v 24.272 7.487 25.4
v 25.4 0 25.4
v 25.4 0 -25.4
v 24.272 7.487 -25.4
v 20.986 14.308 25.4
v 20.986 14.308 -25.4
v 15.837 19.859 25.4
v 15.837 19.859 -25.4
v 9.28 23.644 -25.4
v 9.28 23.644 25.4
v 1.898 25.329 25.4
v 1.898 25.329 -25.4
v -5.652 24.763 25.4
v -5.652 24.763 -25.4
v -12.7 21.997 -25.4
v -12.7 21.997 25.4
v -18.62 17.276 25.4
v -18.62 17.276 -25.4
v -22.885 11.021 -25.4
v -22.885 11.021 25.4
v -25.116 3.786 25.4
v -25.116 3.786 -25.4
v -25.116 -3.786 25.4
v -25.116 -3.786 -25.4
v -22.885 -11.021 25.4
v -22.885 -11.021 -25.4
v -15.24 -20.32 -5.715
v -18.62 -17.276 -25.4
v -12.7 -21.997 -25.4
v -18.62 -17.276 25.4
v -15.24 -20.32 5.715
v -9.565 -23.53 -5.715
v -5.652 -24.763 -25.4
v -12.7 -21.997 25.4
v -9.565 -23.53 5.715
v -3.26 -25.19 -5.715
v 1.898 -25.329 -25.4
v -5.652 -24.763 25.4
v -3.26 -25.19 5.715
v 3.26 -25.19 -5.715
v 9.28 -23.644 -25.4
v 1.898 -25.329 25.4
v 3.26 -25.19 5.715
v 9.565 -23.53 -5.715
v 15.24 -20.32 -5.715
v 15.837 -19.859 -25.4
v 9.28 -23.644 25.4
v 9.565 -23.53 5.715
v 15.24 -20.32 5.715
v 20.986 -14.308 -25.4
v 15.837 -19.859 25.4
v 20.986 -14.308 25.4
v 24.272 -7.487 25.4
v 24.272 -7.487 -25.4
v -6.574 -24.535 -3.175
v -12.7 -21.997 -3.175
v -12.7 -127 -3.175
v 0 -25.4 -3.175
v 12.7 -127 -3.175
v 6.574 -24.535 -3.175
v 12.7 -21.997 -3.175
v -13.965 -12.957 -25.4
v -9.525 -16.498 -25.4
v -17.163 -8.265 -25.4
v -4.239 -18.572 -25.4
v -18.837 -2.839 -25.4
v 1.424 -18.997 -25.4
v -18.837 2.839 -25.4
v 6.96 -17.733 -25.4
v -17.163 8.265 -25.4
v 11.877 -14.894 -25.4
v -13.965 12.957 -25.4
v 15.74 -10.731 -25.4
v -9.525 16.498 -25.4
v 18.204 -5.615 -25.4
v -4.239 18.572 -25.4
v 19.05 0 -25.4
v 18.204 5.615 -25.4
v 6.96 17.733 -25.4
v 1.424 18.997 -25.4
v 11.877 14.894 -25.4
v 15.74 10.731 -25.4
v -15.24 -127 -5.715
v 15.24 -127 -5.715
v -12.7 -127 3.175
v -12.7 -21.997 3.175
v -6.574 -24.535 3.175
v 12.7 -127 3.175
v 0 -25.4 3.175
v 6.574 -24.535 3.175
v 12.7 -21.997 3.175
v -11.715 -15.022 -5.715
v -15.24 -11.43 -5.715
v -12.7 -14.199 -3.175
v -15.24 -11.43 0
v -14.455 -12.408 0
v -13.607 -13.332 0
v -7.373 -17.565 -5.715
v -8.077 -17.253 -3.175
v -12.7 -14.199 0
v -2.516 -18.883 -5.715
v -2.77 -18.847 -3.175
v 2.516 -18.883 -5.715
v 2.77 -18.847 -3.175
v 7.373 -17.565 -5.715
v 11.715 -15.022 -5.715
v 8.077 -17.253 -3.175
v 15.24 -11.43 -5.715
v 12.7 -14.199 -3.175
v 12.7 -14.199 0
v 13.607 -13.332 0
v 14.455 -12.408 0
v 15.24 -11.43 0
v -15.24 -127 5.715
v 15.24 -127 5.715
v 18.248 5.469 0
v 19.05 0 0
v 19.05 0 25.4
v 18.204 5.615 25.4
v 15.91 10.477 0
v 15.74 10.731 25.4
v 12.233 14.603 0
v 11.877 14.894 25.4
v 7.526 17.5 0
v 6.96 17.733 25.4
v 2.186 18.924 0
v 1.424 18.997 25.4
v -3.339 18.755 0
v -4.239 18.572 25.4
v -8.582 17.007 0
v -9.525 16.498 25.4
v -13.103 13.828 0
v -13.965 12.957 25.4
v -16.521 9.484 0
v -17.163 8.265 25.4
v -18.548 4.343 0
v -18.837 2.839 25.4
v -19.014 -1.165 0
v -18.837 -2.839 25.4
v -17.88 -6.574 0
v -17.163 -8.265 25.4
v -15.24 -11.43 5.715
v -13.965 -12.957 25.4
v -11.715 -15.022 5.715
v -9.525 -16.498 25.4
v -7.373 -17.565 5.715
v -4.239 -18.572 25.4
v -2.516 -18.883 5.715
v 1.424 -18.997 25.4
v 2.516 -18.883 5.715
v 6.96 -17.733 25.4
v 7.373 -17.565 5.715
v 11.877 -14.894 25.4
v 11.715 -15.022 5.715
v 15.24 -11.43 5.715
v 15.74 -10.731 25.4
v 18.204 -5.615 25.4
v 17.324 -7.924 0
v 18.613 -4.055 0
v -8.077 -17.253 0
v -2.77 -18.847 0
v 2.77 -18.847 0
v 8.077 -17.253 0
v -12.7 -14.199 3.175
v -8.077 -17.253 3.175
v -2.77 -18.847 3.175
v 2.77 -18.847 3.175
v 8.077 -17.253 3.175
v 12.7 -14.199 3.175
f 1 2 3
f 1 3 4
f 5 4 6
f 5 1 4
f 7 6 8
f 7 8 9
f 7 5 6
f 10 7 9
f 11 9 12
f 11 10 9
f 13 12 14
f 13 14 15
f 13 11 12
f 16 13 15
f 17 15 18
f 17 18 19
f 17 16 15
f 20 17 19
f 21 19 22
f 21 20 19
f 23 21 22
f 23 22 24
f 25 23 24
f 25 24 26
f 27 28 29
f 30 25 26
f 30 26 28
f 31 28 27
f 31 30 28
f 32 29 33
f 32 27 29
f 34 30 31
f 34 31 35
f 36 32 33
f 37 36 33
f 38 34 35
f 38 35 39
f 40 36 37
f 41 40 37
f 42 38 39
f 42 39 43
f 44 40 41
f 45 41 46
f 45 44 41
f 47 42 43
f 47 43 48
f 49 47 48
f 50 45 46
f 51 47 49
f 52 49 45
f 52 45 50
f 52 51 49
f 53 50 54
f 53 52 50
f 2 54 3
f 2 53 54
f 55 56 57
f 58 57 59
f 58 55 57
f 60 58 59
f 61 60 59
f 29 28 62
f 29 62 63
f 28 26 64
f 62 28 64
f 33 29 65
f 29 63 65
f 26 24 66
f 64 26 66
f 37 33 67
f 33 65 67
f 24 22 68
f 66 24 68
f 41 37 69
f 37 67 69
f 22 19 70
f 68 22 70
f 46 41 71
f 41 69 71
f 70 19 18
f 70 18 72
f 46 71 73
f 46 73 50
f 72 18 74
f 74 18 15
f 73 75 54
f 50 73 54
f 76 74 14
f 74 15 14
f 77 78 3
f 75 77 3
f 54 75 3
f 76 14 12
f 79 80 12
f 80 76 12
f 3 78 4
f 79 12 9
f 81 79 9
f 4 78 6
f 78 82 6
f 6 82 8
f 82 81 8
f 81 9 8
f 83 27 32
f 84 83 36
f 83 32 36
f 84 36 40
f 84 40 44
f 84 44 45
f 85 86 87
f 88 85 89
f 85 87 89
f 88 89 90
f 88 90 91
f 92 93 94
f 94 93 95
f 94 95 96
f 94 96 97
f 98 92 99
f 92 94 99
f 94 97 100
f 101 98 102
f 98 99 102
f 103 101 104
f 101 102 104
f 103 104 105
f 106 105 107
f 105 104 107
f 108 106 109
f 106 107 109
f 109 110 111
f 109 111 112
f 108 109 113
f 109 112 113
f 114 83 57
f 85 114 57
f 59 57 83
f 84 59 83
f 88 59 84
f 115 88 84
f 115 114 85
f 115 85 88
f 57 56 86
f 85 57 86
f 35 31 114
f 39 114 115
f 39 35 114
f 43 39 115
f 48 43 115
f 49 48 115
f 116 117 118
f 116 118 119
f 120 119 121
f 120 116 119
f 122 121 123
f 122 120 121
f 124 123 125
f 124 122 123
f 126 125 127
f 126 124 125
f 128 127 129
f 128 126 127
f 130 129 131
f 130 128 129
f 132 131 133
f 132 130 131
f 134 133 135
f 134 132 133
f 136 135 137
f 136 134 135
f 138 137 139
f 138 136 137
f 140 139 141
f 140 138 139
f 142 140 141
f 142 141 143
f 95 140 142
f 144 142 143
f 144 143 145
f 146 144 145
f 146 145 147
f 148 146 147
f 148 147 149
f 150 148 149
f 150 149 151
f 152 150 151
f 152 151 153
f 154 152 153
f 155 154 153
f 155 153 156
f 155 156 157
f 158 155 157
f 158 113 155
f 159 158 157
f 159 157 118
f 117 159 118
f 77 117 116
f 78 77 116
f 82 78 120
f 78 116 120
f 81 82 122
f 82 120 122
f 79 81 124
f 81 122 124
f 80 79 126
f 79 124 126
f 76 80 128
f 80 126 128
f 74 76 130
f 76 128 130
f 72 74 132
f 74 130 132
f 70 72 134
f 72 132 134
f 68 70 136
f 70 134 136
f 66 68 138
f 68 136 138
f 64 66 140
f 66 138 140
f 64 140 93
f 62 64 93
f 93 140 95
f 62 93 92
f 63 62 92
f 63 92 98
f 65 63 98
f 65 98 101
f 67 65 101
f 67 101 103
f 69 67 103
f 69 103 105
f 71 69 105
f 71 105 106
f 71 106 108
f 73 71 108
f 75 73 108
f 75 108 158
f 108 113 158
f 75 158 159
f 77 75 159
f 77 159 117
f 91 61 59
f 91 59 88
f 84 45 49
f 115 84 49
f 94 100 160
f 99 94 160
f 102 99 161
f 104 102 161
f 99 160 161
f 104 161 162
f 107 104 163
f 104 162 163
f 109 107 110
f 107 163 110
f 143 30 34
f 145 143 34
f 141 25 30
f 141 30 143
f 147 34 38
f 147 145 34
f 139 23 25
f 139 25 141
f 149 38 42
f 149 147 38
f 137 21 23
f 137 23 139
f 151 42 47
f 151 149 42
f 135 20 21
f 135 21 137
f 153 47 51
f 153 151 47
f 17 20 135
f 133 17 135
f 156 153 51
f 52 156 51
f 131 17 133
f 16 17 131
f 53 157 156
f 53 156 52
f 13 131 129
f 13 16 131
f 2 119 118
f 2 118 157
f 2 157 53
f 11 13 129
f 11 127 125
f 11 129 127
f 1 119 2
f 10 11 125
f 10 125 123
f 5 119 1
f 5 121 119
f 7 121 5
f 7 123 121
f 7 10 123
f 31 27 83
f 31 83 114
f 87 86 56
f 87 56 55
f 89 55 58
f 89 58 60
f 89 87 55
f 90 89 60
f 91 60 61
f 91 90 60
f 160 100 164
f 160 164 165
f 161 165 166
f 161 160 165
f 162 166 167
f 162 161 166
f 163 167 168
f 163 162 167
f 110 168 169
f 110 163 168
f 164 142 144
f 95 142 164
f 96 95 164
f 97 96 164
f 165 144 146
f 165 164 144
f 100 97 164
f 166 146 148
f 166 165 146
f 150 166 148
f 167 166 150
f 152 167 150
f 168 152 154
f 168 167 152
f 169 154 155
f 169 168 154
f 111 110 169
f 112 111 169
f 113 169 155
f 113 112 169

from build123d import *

# Parameters (mm, degrees)
F0_R          = 25.4
F0_R_2        = 19.05
F1_DEPTH      = 25.4
F1_DEPTH_BACK = 25.4
F2_W          = 30.48
F2_H          = 11.43
F2_W_2        = 25.4
F2_H_2        = 6.35
F3_DEPTH      = 127
F4_DEPTH      = 25.401
F4_DEPTH_BACK = 25.401


with BuildPart() as f1:
    # F0 (on Top) → F1 (new body, two sides)
    with BuildSketch(Plane.XY) as f1_sk:
        Circle(F0_R)
        Circle(F0_R_2, mode=Mode.SUBTRACT)
    extrude(amount=F1_DEPTH)
    extrude(f1_sk.sketch, amount=-F1_DEPTH_BACK)

    # F2 (on Front) → F3 (join)
    with BuildSketch(Plane.XZ):
        Rectangle(F2_W, F2_H)
        Rectangle(F2_W_2, F2_H_2, mode=Mode.SUBTRACT)
    extrude(amount=F3_DEPTH)

    # F0 (on Top) → F4 (cut, two sides)
    with BuildSketch(Plane.XY) as f4_sk:
        Circle(F0_R_2)
    extrude(amount=-F4_DEPTH, mode=Mode.SUBTRACT)
    extrude(f4_sk.sketch, amount=F4_DEPTH_BACK, mode=Mode.SUBTRACT)


solid = f1.part
